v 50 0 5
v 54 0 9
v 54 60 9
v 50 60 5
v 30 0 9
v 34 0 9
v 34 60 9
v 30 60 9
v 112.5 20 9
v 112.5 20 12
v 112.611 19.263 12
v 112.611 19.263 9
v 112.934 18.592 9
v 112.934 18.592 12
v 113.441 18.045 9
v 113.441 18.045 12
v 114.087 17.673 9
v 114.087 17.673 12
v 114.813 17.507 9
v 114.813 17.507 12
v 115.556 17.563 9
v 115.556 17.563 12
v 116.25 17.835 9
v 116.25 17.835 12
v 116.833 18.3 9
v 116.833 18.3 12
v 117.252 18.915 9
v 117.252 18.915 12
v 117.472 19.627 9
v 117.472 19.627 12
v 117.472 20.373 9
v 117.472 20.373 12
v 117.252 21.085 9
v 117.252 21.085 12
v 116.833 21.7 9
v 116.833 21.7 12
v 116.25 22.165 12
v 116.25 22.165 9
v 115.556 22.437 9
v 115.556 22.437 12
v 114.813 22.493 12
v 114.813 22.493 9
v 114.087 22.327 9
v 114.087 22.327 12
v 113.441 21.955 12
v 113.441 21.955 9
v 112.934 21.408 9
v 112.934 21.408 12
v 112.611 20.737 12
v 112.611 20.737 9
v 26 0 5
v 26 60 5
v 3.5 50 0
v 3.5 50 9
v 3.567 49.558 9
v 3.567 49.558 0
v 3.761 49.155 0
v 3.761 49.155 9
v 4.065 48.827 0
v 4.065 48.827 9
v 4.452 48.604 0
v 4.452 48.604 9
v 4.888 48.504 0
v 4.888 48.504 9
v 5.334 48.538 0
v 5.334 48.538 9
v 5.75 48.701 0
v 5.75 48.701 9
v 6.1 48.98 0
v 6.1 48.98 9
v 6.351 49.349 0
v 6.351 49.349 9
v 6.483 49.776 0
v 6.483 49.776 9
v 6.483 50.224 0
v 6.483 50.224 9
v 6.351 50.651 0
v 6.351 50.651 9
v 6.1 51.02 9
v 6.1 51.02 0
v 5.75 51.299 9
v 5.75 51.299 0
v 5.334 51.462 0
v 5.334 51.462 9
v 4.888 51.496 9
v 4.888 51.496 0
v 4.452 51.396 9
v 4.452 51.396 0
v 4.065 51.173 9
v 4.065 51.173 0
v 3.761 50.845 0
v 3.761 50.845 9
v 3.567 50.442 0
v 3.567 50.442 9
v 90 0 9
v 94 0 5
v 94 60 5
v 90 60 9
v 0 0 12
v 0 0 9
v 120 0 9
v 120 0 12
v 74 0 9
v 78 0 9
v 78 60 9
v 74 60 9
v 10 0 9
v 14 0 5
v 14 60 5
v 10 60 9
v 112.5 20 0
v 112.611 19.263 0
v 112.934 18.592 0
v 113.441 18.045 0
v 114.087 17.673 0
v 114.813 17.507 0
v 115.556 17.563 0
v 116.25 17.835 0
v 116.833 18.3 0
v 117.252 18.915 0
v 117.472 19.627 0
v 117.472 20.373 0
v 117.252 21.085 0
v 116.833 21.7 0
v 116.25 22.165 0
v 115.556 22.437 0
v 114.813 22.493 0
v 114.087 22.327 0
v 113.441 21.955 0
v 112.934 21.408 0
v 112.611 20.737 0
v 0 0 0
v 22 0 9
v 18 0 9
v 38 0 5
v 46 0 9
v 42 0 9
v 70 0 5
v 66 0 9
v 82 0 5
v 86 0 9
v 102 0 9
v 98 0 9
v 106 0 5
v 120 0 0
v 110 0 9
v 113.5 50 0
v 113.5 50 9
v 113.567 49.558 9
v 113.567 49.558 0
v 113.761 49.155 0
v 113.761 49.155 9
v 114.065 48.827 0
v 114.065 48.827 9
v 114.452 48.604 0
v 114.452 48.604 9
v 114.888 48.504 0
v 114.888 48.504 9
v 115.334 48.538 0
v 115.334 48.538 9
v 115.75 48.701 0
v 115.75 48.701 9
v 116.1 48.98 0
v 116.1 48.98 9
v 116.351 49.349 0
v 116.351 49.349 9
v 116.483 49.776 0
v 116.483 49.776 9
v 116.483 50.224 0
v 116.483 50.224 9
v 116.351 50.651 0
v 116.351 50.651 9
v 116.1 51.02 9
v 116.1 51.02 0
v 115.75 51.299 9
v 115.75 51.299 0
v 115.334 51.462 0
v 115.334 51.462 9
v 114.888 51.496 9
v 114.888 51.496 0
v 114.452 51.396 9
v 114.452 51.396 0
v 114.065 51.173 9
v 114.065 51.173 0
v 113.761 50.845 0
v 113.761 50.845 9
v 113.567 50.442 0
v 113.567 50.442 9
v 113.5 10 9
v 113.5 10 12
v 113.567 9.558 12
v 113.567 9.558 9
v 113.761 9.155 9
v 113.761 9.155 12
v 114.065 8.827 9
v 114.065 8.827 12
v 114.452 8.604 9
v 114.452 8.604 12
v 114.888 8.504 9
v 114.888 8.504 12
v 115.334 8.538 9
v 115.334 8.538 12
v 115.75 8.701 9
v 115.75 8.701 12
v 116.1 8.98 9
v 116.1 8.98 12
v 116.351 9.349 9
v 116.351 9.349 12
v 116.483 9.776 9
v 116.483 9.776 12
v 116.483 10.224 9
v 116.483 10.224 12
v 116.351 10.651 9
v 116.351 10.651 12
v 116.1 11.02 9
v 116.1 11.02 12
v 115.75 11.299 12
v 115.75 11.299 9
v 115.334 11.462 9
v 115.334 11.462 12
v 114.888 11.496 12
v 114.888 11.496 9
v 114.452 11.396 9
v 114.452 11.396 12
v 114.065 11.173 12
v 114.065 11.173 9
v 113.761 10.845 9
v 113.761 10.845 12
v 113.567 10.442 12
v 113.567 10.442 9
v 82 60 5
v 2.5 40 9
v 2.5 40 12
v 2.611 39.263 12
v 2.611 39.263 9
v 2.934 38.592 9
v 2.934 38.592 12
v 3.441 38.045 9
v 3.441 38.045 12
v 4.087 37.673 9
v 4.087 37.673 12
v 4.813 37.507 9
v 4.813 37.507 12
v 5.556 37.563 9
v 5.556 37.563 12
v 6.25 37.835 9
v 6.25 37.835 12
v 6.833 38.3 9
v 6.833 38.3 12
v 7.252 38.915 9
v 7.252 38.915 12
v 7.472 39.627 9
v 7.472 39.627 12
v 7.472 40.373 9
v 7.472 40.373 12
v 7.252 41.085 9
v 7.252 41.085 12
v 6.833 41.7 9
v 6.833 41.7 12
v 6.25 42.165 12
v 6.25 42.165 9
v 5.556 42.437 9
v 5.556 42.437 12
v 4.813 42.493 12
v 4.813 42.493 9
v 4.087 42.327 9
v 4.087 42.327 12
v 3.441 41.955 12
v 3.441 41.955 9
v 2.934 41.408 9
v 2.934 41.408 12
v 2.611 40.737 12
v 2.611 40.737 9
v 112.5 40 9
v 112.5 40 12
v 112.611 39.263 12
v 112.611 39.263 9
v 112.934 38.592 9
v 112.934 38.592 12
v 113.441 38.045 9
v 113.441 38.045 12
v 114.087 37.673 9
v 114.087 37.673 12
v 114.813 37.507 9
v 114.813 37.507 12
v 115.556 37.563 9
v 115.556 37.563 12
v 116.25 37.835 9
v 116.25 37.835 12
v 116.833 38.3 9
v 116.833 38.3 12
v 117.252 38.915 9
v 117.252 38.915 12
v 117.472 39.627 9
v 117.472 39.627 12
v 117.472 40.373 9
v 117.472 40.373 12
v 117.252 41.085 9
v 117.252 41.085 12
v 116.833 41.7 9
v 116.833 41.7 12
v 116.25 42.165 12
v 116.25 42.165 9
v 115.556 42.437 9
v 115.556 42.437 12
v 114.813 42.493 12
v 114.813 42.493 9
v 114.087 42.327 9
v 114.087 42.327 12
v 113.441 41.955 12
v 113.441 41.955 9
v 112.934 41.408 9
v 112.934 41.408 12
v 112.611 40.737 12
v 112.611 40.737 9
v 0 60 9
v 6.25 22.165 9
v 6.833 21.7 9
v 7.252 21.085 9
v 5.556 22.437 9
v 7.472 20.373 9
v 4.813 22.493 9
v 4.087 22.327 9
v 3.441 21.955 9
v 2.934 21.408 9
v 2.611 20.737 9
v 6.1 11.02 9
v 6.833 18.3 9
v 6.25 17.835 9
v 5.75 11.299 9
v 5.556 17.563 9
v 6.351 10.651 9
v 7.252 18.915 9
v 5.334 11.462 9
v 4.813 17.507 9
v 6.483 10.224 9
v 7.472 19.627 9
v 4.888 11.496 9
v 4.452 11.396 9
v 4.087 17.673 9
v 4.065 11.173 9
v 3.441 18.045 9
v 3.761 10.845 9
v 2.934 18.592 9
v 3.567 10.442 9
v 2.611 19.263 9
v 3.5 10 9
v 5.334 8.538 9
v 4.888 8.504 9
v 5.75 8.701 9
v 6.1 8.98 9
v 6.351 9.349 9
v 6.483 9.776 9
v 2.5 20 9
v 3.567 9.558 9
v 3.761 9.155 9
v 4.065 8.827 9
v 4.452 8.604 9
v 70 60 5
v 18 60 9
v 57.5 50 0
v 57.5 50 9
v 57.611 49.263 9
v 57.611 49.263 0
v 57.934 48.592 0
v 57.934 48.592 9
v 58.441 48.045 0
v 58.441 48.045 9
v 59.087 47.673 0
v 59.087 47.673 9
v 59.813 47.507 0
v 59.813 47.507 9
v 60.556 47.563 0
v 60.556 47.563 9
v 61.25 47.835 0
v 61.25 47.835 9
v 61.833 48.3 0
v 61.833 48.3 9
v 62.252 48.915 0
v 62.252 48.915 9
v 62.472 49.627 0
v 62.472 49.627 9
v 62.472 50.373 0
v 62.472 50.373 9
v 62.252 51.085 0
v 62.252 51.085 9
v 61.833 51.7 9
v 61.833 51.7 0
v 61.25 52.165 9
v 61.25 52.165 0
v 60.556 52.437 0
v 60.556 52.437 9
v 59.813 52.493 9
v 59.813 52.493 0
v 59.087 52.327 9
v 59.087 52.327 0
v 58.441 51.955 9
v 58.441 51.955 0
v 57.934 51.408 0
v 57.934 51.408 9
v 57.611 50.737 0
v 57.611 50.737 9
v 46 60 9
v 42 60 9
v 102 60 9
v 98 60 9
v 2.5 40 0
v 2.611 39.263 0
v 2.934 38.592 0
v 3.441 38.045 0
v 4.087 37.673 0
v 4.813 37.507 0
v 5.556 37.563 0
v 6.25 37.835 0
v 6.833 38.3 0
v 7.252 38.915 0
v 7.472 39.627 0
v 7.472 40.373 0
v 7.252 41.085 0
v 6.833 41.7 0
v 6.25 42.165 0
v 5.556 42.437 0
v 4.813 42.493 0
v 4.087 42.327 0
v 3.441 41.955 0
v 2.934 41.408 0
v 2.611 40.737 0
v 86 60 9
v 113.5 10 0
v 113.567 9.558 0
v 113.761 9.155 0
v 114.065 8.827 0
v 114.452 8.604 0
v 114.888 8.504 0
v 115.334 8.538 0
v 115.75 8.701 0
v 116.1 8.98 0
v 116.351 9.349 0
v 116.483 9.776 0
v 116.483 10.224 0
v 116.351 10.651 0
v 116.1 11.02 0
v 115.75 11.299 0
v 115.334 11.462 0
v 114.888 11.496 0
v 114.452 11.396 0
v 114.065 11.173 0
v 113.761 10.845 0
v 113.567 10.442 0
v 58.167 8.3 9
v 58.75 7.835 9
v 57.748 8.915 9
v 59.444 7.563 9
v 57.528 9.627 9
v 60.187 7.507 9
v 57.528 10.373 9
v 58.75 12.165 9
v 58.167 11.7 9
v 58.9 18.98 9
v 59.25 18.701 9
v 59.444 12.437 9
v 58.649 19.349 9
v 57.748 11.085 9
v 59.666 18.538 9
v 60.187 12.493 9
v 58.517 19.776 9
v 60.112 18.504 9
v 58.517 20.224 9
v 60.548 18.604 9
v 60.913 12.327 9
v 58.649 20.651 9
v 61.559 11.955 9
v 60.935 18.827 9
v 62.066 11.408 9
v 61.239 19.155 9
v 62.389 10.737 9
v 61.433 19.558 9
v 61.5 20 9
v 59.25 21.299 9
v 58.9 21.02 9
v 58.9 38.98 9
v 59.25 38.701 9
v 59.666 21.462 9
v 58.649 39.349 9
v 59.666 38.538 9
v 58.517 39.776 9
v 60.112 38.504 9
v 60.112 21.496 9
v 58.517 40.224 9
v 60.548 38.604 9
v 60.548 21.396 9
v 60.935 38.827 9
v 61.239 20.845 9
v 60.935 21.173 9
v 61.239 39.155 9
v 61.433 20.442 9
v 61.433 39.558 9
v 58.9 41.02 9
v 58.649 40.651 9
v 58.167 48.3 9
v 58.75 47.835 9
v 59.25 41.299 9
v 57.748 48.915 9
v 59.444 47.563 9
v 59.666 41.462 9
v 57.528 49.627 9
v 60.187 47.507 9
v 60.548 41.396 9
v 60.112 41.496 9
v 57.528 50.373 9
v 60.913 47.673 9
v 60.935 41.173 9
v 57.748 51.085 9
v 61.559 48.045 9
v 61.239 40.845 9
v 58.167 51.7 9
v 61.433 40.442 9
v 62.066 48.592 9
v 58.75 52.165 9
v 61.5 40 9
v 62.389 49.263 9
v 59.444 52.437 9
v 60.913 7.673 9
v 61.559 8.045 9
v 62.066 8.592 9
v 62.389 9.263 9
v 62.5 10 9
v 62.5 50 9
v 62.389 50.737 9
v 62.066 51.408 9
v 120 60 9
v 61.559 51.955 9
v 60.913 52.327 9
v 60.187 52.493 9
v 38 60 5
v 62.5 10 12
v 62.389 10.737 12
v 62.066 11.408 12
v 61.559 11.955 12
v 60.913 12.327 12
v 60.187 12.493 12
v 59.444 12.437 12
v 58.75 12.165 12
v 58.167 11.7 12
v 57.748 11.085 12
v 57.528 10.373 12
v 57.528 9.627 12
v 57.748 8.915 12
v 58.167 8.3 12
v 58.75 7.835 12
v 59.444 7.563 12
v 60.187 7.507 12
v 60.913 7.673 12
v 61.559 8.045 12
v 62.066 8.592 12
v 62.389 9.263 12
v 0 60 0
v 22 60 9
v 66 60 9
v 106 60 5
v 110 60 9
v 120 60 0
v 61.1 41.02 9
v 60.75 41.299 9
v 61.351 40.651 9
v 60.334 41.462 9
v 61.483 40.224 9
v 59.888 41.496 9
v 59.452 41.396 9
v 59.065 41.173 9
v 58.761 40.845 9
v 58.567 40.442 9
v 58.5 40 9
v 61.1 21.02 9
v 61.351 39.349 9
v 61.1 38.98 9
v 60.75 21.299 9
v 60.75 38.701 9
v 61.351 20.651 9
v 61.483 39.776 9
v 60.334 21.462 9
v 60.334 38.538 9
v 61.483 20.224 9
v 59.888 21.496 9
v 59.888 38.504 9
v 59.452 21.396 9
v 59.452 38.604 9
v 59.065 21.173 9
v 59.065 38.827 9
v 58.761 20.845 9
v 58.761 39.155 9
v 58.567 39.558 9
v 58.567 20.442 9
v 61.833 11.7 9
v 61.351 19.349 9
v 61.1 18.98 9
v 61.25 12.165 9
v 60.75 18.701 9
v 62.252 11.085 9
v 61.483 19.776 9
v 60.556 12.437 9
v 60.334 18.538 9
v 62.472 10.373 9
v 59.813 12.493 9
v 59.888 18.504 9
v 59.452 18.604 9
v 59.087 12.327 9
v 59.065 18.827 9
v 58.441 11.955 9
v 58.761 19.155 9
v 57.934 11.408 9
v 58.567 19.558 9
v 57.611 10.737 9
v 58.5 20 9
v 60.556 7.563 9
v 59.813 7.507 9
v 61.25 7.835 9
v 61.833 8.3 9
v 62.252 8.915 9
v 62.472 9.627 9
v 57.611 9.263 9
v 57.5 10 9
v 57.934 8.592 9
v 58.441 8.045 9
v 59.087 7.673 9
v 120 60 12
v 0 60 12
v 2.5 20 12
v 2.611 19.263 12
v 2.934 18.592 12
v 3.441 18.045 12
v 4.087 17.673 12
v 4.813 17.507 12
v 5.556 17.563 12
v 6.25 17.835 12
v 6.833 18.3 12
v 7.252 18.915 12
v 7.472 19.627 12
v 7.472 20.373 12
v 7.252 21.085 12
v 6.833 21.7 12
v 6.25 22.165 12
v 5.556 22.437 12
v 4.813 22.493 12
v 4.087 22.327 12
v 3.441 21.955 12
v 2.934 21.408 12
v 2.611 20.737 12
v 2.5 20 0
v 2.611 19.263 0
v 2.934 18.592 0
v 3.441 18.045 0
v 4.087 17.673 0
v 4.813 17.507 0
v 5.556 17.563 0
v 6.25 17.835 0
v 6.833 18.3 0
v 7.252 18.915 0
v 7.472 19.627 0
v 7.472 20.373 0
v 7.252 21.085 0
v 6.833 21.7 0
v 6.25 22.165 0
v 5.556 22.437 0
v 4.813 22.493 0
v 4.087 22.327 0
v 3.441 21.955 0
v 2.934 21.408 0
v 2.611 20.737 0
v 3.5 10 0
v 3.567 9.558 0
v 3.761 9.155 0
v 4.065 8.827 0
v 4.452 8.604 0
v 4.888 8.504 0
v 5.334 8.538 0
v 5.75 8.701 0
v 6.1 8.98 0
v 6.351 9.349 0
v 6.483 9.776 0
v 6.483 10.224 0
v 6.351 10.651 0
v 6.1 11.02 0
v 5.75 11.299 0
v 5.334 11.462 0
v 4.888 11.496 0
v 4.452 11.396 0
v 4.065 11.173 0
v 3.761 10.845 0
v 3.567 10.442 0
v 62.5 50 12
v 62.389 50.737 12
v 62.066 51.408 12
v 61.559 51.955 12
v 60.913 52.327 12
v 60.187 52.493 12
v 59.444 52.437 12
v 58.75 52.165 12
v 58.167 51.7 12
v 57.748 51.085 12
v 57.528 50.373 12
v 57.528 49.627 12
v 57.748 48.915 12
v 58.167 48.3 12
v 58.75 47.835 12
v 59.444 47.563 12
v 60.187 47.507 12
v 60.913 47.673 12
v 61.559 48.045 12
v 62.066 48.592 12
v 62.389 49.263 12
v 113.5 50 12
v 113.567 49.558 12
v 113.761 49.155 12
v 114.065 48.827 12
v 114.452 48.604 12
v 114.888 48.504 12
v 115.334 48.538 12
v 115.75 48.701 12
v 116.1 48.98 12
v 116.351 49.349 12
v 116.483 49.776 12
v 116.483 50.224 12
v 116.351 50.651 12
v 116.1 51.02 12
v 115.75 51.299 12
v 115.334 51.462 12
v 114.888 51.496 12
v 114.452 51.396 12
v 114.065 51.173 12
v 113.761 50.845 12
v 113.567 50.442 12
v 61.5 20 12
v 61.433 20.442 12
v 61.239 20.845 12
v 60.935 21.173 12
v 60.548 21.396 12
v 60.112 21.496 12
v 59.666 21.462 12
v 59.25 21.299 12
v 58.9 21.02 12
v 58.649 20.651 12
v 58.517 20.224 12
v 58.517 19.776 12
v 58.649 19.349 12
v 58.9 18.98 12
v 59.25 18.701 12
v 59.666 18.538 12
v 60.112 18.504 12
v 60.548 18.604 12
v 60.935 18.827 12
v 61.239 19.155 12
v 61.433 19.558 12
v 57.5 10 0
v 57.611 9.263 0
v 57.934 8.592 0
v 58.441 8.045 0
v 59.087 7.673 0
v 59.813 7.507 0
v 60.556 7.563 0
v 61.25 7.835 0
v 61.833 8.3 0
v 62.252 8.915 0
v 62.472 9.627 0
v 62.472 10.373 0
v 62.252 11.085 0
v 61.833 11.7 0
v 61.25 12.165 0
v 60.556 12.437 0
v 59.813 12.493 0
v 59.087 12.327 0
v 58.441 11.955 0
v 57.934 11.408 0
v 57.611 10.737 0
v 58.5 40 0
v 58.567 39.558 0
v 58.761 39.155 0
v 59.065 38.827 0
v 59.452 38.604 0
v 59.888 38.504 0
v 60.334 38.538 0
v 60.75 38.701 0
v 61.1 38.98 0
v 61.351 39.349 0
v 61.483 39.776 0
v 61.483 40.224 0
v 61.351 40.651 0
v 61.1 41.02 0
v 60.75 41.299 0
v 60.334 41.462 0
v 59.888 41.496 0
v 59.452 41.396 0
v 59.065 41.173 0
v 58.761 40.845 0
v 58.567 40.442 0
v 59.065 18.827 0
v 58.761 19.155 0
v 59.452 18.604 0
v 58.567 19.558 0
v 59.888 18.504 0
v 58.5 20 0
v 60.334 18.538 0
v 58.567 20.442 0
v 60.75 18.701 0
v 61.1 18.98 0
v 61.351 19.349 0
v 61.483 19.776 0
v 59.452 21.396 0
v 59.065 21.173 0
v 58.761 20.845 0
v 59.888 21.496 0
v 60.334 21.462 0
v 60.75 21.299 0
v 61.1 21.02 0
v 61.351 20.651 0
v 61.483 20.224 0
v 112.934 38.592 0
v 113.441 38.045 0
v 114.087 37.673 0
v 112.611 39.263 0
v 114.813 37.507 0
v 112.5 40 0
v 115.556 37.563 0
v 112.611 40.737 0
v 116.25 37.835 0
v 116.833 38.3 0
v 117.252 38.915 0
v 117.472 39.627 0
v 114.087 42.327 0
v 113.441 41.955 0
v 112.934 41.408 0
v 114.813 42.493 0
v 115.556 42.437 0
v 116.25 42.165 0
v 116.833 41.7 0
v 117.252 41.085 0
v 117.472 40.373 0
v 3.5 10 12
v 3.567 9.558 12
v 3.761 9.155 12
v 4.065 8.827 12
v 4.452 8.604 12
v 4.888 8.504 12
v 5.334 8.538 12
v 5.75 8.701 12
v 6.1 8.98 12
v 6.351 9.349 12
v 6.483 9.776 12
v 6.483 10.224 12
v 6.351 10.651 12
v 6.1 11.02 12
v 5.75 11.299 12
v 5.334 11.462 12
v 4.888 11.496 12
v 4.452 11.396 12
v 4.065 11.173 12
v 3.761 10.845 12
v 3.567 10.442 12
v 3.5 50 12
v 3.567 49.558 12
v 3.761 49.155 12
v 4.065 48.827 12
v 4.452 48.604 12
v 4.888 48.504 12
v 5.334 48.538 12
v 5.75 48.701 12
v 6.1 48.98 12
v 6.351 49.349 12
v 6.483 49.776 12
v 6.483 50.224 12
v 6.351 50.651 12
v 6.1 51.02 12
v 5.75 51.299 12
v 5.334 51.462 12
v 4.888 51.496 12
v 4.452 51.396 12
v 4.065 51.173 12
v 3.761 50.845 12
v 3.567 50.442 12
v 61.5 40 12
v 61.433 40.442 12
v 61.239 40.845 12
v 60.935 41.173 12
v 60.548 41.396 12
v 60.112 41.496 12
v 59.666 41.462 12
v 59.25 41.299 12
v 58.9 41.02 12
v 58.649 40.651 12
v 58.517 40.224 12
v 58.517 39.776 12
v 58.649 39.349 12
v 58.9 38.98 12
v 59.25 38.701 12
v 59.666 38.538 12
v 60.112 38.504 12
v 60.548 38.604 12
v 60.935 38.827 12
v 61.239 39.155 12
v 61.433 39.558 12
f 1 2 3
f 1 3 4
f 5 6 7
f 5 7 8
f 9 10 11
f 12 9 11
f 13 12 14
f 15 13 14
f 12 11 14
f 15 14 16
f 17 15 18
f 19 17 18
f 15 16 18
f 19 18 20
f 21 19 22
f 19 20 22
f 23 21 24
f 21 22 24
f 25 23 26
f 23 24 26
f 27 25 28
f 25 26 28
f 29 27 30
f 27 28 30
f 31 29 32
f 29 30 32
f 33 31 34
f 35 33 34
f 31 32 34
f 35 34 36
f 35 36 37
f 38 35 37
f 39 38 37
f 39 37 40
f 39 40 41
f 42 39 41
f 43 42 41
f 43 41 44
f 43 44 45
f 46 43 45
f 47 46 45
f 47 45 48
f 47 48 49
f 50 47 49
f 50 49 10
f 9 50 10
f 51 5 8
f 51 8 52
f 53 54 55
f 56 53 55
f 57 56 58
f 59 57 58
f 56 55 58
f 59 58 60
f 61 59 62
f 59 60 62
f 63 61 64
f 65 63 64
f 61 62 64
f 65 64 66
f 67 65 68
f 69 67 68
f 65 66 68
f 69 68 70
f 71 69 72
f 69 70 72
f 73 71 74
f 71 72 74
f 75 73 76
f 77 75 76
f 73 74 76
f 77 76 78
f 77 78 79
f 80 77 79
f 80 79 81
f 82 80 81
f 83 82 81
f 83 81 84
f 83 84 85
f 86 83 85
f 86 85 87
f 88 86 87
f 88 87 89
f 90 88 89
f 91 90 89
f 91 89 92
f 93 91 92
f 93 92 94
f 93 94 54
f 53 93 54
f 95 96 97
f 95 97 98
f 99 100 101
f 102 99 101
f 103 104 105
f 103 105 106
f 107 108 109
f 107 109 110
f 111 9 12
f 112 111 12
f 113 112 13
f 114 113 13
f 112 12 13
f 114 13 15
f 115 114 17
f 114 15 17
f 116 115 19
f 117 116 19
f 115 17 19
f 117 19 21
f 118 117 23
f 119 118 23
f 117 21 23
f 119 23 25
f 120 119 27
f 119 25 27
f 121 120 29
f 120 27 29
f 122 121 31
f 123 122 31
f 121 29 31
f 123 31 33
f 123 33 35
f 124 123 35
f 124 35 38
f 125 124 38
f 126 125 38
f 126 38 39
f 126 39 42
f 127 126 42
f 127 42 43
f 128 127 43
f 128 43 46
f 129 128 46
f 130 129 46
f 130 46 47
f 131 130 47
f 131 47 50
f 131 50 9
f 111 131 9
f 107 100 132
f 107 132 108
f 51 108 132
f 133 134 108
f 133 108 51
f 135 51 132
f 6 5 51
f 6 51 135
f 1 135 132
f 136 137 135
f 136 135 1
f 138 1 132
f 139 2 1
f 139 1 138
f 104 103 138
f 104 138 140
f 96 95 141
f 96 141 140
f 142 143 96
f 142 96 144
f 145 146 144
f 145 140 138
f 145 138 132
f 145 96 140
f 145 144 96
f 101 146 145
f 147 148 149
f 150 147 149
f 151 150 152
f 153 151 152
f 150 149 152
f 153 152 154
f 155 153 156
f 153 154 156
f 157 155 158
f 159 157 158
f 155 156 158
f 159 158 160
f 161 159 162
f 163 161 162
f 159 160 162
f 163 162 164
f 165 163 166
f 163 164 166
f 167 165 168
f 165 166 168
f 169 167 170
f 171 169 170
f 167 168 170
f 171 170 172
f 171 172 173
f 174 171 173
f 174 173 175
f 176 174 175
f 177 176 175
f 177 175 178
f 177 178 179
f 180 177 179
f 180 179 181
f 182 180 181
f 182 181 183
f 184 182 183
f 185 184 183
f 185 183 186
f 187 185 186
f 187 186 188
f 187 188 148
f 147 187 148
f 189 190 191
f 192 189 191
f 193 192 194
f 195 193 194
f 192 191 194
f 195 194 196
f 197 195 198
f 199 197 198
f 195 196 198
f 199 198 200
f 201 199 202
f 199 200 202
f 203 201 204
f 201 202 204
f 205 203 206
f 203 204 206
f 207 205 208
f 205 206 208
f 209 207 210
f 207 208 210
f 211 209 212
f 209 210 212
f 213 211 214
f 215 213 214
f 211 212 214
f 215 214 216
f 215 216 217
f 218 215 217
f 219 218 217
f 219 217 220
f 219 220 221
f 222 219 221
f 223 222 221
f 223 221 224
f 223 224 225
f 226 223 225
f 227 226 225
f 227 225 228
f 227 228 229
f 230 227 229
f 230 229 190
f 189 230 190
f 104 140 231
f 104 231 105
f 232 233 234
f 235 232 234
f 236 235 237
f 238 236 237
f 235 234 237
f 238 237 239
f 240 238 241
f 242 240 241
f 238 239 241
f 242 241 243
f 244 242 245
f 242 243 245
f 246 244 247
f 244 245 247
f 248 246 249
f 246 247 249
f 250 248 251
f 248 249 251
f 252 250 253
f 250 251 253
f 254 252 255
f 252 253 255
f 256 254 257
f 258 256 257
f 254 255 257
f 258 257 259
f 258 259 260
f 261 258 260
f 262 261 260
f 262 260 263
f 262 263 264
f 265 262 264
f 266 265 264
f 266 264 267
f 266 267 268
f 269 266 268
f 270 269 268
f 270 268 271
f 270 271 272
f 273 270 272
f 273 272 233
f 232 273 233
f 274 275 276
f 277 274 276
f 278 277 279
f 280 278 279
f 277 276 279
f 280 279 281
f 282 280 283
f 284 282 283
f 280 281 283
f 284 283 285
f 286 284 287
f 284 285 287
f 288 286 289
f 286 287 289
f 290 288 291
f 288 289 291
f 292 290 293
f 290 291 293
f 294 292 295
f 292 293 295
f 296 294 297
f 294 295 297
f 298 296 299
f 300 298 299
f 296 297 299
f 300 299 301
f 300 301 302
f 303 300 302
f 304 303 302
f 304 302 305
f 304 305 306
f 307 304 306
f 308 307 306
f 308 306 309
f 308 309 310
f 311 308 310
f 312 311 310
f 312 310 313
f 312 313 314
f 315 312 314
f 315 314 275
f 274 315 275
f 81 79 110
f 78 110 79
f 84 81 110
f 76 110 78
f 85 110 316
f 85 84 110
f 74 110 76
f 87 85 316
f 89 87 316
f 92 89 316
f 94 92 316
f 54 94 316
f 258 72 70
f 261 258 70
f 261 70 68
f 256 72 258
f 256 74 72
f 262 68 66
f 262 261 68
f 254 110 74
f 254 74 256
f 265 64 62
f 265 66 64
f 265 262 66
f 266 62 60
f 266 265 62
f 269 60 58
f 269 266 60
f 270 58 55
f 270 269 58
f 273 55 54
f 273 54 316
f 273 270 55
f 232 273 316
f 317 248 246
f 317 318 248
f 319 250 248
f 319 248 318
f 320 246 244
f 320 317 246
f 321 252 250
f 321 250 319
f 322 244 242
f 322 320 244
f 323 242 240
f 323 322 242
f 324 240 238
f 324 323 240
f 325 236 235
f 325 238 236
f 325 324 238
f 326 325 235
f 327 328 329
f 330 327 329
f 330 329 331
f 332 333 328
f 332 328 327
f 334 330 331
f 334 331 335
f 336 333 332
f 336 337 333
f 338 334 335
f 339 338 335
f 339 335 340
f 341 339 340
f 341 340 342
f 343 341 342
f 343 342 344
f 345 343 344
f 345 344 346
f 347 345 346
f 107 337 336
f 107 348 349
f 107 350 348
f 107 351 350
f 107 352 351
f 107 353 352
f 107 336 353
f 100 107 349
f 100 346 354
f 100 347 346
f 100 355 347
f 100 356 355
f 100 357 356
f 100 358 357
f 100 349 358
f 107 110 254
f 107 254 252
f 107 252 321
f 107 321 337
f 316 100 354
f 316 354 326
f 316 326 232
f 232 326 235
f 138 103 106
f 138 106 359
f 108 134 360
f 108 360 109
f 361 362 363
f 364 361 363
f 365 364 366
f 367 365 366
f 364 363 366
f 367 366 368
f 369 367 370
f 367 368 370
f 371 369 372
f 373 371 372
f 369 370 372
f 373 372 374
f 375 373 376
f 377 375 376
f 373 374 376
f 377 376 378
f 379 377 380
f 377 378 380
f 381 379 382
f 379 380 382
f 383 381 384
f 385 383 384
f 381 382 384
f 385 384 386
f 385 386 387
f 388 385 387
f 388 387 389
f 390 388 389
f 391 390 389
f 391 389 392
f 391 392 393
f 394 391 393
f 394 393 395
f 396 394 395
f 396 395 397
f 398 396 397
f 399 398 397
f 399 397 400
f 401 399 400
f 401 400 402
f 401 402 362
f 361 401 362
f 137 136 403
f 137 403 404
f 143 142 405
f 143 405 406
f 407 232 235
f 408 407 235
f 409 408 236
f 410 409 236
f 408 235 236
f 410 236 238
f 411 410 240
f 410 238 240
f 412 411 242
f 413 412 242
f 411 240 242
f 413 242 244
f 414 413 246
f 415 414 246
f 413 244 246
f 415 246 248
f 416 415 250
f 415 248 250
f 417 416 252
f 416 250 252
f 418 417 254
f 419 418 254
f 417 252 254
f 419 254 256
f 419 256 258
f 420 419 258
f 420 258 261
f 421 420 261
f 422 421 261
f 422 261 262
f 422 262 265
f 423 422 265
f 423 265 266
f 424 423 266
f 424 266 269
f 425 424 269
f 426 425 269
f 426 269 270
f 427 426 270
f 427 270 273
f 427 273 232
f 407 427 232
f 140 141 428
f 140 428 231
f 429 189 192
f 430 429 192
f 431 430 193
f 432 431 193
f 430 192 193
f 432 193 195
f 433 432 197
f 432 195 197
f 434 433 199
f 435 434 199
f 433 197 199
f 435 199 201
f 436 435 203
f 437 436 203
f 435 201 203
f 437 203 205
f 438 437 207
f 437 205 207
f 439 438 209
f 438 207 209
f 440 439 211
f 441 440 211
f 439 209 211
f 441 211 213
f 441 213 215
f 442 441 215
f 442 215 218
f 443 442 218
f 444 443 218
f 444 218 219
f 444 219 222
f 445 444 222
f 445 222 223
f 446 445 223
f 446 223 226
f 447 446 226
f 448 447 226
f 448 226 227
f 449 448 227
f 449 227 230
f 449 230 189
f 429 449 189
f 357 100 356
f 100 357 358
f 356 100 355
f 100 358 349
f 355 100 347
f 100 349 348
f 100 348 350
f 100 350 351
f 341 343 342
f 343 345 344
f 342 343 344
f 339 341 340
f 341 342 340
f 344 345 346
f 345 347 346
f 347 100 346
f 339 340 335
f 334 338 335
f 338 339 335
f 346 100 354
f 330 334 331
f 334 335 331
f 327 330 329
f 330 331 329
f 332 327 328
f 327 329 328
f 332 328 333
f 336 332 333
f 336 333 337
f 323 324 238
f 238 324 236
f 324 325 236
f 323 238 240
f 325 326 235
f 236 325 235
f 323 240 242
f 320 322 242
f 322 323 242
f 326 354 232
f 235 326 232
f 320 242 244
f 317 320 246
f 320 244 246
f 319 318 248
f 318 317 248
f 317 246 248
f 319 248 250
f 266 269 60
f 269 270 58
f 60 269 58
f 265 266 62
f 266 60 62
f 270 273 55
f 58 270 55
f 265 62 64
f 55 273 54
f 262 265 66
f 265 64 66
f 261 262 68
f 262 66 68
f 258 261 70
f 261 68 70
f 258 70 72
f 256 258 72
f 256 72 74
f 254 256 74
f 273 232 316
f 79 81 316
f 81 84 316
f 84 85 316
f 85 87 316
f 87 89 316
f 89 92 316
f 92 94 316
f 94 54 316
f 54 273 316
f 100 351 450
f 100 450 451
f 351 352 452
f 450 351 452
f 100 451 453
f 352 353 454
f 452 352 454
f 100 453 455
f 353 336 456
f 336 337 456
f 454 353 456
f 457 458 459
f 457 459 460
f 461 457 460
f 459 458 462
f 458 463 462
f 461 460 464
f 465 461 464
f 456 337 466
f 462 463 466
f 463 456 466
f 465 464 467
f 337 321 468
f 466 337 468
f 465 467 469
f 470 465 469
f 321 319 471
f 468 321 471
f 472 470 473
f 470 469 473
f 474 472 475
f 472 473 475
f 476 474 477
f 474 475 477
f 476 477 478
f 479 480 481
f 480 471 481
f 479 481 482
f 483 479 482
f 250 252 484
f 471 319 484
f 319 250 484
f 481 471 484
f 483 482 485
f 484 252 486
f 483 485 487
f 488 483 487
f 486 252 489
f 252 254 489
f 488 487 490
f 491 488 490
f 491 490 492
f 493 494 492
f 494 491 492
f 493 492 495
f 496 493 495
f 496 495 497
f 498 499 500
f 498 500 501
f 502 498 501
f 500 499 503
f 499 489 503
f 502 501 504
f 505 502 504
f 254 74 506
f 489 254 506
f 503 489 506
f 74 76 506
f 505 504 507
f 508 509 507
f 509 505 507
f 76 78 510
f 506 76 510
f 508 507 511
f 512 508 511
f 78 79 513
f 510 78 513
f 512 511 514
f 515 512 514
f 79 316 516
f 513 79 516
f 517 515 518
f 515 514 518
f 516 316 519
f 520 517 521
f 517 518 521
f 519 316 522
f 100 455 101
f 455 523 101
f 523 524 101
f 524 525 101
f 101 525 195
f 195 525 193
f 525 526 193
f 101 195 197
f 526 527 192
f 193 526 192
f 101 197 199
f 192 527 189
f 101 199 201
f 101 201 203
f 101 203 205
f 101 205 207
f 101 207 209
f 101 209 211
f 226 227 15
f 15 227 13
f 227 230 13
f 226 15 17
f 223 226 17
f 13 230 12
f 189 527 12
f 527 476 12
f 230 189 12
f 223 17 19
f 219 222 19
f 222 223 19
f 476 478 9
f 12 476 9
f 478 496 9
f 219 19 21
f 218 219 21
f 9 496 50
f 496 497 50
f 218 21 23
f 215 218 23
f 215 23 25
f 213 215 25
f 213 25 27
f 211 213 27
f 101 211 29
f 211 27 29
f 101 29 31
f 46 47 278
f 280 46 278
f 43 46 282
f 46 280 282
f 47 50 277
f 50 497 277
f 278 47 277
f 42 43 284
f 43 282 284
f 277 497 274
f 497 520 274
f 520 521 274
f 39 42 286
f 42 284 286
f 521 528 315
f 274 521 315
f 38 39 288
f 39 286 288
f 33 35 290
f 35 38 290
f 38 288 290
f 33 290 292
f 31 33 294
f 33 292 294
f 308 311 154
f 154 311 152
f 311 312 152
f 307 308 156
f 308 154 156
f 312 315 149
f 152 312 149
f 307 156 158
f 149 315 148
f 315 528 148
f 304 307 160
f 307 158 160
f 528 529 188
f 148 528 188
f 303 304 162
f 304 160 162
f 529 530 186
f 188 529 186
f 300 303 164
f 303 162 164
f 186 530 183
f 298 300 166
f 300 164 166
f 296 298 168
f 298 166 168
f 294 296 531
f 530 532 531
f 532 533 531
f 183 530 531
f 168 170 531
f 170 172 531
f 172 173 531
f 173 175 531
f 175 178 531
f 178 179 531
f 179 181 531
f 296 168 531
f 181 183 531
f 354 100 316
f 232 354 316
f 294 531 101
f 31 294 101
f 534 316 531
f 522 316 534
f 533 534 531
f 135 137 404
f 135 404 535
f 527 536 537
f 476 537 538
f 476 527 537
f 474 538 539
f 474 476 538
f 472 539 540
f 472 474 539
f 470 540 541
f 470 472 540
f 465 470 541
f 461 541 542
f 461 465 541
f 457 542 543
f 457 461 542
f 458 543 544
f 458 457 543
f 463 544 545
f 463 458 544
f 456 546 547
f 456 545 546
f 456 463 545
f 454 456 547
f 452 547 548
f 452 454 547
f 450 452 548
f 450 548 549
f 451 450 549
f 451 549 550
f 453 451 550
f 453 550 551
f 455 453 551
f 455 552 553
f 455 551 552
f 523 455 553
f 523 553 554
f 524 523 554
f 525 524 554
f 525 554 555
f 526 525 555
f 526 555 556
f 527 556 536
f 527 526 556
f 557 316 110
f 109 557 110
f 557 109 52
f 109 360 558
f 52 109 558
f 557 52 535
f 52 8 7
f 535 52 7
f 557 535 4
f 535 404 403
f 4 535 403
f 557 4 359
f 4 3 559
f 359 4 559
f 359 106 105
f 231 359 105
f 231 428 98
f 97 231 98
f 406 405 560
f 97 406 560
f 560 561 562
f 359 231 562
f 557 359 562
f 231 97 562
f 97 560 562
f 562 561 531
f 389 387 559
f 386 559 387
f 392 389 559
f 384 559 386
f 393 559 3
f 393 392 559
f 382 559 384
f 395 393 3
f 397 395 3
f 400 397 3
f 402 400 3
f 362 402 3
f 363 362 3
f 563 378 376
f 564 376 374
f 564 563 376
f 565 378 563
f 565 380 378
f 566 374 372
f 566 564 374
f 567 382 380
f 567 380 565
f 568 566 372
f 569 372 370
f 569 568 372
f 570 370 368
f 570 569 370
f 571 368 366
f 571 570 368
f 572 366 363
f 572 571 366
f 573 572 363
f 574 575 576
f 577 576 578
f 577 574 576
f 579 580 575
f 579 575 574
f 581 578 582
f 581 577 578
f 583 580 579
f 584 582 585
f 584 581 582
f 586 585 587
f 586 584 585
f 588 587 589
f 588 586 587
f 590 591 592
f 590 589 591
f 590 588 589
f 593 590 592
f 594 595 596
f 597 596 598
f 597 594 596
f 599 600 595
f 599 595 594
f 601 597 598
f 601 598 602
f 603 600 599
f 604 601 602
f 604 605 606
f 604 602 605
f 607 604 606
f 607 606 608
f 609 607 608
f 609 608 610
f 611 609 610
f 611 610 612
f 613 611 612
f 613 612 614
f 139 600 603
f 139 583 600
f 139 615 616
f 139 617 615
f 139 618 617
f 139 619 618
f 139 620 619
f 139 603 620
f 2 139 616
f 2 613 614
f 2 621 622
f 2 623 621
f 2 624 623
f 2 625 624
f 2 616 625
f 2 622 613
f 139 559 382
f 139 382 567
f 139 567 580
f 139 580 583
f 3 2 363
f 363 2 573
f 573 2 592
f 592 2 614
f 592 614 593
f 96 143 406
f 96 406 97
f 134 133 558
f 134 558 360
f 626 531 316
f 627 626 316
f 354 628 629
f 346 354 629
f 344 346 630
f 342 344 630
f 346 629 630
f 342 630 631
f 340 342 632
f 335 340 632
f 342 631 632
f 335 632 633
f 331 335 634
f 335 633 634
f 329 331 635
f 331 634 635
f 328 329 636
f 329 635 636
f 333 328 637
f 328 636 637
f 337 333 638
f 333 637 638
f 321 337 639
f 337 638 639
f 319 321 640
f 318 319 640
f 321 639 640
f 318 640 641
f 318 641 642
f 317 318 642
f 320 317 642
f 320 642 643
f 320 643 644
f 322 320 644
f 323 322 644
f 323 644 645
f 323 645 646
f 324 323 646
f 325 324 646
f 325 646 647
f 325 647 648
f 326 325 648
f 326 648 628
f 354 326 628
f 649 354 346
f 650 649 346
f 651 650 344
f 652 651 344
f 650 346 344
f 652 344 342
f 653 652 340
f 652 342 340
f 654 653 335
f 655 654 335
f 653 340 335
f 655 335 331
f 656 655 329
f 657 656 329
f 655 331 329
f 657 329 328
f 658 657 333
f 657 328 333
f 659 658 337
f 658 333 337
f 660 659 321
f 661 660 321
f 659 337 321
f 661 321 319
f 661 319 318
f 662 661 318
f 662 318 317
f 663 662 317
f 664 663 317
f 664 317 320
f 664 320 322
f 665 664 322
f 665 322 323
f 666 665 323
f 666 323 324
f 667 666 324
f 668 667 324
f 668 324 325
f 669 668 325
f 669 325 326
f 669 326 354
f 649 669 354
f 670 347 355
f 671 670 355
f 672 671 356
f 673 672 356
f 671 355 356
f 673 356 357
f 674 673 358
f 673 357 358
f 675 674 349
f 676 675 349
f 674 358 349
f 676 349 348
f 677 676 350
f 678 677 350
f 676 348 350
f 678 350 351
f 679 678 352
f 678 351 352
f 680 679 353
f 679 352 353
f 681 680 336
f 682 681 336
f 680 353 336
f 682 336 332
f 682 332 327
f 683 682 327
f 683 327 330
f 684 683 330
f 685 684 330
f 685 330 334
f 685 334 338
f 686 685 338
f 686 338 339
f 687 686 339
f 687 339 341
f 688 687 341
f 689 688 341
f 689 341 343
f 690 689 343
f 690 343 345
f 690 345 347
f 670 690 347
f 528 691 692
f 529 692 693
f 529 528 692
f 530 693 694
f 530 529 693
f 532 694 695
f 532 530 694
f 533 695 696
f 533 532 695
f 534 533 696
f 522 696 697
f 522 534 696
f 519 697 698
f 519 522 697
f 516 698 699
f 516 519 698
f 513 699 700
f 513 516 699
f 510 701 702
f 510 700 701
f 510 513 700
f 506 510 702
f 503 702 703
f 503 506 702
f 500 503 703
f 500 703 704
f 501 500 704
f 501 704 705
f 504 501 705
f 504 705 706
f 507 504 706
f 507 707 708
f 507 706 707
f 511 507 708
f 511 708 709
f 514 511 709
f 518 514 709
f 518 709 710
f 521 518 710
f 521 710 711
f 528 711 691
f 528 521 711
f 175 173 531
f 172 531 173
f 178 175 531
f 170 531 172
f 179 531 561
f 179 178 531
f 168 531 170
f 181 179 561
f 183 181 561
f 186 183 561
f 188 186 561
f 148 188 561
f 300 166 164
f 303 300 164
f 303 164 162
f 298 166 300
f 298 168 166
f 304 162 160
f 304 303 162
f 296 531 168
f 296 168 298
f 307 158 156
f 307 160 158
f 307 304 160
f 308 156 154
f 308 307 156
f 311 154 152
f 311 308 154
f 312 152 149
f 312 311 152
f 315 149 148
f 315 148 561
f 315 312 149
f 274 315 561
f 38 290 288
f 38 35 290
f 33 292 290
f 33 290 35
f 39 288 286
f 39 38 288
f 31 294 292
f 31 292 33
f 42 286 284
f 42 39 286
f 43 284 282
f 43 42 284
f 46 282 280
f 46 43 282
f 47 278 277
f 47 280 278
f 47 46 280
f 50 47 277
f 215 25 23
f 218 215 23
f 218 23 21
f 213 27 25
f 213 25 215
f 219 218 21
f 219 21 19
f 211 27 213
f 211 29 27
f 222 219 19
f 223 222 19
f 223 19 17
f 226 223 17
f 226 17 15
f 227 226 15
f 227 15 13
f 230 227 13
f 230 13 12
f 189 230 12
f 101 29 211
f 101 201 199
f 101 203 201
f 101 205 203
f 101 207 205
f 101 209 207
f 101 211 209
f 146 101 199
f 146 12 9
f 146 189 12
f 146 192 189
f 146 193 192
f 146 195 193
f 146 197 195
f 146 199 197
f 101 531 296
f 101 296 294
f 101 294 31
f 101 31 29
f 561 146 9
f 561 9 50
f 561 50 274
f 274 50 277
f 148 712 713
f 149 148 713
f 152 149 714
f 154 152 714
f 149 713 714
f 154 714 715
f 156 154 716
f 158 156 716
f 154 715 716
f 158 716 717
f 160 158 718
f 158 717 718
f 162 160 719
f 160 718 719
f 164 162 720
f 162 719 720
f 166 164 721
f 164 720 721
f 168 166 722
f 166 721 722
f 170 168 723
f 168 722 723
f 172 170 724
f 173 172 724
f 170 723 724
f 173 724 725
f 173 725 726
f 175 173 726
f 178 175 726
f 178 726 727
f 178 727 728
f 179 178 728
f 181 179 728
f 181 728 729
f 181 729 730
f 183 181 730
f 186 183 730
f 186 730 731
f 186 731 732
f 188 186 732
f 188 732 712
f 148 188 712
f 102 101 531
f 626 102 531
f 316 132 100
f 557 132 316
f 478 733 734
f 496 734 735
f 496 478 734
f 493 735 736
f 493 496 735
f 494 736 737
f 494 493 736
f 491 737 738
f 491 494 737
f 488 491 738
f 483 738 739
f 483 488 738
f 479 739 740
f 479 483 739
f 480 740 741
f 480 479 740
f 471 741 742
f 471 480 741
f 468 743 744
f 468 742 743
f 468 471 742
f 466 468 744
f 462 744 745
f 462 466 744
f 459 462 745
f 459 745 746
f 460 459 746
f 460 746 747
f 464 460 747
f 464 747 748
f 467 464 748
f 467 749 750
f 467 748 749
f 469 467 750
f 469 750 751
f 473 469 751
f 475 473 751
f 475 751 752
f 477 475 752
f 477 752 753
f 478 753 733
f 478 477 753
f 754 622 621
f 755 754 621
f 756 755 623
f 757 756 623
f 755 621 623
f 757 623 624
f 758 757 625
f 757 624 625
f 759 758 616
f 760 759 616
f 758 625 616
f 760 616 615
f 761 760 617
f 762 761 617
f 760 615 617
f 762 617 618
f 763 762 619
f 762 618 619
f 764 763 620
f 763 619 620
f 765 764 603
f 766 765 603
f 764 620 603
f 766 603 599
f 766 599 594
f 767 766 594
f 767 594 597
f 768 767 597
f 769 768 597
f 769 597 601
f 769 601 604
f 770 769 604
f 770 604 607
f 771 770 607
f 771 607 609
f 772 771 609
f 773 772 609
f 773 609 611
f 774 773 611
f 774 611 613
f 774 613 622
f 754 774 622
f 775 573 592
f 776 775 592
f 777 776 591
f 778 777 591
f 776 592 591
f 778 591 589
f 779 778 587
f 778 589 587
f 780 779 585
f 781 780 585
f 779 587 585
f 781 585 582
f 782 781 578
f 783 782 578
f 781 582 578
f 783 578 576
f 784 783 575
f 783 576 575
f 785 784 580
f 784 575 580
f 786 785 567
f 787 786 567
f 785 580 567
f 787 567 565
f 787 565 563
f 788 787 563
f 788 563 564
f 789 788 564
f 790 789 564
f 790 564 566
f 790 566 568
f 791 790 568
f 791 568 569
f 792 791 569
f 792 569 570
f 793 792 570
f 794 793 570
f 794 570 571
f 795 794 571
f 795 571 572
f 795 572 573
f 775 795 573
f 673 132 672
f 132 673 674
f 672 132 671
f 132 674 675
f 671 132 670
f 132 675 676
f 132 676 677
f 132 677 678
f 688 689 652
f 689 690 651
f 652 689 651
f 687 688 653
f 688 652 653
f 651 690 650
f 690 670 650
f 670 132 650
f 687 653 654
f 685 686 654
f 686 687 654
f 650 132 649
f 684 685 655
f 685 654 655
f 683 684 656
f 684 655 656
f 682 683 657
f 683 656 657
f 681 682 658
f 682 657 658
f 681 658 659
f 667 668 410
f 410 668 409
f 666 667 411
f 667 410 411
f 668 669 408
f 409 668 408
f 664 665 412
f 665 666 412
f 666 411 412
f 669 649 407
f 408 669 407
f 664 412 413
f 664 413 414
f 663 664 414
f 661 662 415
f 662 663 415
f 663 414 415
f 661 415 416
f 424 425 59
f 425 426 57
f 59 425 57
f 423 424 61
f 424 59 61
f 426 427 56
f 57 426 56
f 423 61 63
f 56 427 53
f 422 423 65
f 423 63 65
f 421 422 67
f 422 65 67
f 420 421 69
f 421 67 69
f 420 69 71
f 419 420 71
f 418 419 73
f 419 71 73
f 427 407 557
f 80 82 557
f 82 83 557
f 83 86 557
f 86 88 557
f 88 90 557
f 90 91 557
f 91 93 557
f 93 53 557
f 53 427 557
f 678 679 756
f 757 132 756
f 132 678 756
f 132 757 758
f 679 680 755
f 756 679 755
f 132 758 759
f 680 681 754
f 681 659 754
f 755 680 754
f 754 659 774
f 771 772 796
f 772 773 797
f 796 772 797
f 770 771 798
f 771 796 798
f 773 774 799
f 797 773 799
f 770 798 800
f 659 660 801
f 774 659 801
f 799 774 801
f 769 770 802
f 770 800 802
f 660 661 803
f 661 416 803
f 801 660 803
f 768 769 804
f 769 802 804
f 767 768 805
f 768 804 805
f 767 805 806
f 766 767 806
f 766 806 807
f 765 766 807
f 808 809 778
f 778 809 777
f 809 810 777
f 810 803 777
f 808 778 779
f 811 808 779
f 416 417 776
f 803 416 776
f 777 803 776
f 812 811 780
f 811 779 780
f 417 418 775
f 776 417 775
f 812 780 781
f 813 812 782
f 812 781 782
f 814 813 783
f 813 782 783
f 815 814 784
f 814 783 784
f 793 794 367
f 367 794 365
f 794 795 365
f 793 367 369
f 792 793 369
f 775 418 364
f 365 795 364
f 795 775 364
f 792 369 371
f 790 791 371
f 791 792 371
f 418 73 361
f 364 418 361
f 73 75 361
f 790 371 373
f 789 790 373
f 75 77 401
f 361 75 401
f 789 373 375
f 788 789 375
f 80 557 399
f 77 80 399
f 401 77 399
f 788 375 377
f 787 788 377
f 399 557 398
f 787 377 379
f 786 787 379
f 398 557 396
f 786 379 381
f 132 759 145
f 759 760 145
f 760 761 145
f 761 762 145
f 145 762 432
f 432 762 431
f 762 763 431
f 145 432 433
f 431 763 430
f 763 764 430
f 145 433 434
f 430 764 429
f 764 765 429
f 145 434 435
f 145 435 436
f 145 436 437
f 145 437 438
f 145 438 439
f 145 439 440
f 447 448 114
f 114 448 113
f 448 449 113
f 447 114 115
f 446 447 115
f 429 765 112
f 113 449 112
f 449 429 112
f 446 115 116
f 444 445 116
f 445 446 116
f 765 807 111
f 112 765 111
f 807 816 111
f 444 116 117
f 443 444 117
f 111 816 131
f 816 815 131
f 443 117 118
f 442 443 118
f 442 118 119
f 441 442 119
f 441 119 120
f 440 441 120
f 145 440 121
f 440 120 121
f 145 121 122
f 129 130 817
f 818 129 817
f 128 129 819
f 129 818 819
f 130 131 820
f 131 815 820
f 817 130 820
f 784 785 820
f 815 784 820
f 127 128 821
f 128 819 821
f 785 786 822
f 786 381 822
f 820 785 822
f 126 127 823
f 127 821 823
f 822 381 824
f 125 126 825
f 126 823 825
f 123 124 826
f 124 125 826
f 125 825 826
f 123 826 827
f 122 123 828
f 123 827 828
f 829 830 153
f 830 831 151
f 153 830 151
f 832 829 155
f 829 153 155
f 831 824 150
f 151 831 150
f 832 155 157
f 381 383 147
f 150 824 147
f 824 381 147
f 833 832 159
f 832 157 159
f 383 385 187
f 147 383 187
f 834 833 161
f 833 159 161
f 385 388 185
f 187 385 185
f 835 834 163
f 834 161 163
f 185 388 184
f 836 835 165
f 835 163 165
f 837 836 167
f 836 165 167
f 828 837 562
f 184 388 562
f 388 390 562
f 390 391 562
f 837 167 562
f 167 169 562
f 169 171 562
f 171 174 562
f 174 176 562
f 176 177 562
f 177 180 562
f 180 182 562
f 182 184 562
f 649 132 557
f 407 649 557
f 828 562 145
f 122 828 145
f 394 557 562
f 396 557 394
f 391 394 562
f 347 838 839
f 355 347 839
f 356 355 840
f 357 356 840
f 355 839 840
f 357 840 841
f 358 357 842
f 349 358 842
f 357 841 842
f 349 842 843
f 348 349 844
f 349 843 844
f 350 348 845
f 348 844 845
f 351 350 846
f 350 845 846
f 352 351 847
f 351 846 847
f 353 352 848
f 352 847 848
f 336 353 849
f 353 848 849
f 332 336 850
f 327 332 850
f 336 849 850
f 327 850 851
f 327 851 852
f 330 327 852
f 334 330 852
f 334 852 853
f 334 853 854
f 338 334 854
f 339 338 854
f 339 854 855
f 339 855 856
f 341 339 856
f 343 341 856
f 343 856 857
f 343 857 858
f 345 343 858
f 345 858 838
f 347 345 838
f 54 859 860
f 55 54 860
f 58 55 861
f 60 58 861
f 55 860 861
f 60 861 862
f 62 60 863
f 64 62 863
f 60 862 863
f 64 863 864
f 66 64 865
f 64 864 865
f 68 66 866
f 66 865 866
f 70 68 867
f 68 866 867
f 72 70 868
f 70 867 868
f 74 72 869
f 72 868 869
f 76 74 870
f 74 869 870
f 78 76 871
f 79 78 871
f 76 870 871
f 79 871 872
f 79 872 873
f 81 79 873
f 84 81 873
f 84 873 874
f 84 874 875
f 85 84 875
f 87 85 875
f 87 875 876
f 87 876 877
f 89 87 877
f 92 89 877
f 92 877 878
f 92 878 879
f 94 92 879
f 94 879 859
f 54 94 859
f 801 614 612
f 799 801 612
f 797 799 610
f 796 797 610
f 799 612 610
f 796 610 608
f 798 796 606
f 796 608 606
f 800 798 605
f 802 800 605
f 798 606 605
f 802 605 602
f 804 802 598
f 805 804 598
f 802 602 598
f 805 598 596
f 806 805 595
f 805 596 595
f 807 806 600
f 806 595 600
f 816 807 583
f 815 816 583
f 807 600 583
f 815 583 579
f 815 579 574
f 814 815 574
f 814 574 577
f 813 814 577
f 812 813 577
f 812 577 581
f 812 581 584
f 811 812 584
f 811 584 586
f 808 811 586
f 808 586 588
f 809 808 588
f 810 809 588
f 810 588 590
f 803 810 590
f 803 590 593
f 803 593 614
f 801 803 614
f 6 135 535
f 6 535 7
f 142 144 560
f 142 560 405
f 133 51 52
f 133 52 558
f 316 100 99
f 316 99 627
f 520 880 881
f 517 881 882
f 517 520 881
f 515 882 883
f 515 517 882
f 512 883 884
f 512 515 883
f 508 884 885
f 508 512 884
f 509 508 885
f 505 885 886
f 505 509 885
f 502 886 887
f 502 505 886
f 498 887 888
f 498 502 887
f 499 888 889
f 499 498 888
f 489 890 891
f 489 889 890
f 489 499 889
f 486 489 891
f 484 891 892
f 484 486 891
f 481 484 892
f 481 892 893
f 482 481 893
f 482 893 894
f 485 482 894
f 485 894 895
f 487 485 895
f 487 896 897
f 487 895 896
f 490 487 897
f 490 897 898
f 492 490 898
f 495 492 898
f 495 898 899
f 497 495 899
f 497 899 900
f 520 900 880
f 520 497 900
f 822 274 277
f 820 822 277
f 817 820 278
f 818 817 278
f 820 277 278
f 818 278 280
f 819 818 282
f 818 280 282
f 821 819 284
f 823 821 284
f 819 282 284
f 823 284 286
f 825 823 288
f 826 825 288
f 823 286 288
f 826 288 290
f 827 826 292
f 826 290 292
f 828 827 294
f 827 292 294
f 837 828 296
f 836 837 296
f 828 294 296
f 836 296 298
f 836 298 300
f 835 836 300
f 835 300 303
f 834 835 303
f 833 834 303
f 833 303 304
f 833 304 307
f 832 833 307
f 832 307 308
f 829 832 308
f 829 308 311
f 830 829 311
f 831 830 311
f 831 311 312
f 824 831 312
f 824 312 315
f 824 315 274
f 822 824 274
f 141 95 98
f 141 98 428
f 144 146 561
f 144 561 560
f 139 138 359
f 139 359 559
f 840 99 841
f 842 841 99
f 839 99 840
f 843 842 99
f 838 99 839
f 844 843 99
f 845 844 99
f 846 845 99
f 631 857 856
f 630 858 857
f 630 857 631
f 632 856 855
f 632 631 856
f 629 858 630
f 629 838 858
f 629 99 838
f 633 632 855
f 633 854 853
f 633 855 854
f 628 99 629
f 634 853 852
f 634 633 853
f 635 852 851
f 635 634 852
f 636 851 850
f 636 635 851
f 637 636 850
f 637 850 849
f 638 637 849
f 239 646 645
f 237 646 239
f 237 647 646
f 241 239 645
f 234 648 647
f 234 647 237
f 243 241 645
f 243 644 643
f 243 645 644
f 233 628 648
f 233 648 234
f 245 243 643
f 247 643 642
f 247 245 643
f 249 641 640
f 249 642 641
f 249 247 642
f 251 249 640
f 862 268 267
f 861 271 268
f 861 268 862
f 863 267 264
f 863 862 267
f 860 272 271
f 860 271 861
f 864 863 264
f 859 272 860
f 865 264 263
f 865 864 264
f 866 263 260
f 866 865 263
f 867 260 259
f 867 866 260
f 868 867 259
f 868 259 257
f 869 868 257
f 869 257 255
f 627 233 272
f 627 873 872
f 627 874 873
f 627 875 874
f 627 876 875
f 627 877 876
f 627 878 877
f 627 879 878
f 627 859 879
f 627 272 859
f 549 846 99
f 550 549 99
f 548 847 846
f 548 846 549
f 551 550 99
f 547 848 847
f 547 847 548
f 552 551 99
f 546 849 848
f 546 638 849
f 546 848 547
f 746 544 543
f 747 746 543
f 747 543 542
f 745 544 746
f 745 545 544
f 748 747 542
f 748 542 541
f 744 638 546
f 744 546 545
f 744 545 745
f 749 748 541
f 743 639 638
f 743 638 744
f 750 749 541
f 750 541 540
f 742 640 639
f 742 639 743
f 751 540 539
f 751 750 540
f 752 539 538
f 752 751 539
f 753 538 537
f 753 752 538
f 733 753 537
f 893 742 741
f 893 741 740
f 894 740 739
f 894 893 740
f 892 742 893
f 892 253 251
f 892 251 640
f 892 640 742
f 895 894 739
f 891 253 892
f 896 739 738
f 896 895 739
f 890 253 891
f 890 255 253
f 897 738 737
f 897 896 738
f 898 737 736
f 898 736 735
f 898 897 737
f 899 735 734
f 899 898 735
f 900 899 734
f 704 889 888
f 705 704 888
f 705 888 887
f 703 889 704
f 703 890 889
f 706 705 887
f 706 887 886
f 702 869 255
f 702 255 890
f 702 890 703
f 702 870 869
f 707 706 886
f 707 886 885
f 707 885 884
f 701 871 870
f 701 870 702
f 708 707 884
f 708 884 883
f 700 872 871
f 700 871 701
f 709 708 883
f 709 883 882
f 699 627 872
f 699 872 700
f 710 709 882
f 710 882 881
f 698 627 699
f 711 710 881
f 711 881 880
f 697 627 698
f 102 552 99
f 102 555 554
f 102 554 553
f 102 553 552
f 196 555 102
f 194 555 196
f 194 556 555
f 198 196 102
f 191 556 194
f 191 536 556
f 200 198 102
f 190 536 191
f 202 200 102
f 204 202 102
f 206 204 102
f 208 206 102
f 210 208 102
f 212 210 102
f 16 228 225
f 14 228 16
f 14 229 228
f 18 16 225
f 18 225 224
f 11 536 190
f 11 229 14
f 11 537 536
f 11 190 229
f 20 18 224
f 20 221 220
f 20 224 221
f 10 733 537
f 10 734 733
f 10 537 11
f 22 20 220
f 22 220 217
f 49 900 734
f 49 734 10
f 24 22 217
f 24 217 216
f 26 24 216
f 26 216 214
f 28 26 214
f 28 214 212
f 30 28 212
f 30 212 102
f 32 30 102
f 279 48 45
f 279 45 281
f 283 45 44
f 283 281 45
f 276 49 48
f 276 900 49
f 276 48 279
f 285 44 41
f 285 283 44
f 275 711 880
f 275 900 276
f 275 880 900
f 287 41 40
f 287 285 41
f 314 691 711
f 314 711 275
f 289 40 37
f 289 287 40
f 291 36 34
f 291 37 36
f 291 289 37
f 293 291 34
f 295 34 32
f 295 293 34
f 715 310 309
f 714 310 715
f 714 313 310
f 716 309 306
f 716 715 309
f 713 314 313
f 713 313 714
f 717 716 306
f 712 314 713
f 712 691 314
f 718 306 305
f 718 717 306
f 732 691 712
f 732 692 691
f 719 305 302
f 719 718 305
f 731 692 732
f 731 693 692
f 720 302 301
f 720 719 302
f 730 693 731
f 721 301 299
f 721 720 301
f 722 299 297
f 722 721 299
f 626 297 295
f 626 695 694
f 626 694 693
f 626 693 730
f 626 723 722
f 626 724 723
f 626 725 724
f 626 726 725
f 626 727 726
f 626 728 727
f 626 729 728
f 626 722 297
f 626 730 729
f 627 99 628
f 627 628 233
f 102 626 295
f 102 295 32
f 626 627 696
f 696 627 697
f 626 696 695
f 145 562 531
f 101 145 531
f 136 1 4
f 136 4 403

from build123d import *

# Parameters (mm, degrees)
F0_W     = 120
F0_H     = 60
F1_DEPTH = 5
F3_DEPTH = 60
F4_D     = 5
F5_D     = 5
F6_D     = 3
F7_W     = 54
F7_H     = 60
F7_W_2   = 12
F7_R     = 2.5
F7_R_2   = 1.5
F8_DEPTH = 3
F9_D     = 3
F10_D    = 5


with BuildPart() as f1:
    # F0 (on Top) → F1 (new body)
    with BuildSketch(Plane.XY):
        with Locations((60, 30)):
            Rectangle(F0_W, F0_H)
    extrude(amount=F1_DEPTH)

    # F2 (on face) → F3 (join)
    with BuildSketch(Plane.XZ):
        Polygon((106, 5), (120, 5), (120, 9), (110, 9), align=None)
        Polygon((94, 5), (106, 5), (102, 9), (98, 9), align=None)
        Polygon((82, 5), (94, 5), (90, 9), (86, 9), align=None)
        Polygon((70, 5), (82, 5), (78, 9), (74, 9), align=None)
        Polygon((54, 9), (50, 5), (70, 5), (66, 9), align=None)
        Polygon((42, 9), (38, 5), (50, 5), (46, 9), align=None)
        Polygon((30, 9), (26, 5), (38, 5), (34, 9), align=None)
        Polygon((18, 9), (14, 5), (26, 5), (22, 9), align=None)
        Polygon((0, 9), (0, 5), (14, 5), (10, 9), align=None)
    extrude(amount=-F3_DEPTH)

    # F4 (through all)
    with Locations(Plane(origin=(0, 0, 0), x_dir=(1, 0, 0), z_dir=(0, 0, -1))):
        with Locations((115, -20), (115, -40), (5, -20), (5, -40)):
            Hole(F4_D / 2)

    # F5 (through all)
    with Locations(Plane(origin=(0, 0, 0), x_dir=(1, 0, 0), z_dir=(0, 0, -1))):
        with Locations((60, -50), (60, -10)):
            Hole(F5_D / 2)

    # F6 (through all)
    with Locations(Plane(origin=(0, 0, 0), x_dir=(1, 0, 0), z_dir=(0, 0, -1))):
        with Locations((5, -50), (5, -10), (60, -40), (60, -20), (115, -10), (115, -50)):
            Hole(F6_D / 2)


with BuildPart() as f8:
    # F7 (on face) → F8 (new body)
    with BuildSketch(Plane.XY.offset(9)):
        with Locations((27, 30)):
            Rectangle(F7_W, F7_H)
        with Locations((93, 30)):
            Rectangle(F7_W, F7_H)
        with Locations((60, 30)):
            Rectangle(F7_W_2, F7_H)
        with Locations((60, 10)):
            Circle(F7_R, mode=Mode.SUBTRACT)
        with Locations((60, 20)):
            Circle(F7_R_2, mode=Mode.SUBTRACT)
        with Locations((60, 40)):
            Circle(F7_R_2, mode=Mode.SUBTRACT)
        with Locations((60, 50)):
            Circle(F7_R, mode=Mode.SUBTRACT)
    extrude(amount=F8_DEPTH)

    # F9 (through all)
    with Locations(Plane(origin=(0, 0, 0), x_dir=(1, 0, 0), z_dir=(0, 0, -1))):
        with Locations((115, -10), (115, -50), (60, -40), (60, -20), (5, -10), (5, -50)):
            Hole(F9_D / 2)

    # F10 (through all)
    with Locations(Plane(origin=(0, 0, 0), x_dir=(1, 0, 0), z_dir=(0, 0, -1))):
        with Locations((115, -20), (115, -40), (60, -50), (60, -10), (5, -20), (5, -40)):
            Hole(F10_D / 2)


solid = Compound([f1.part, f8.part])
